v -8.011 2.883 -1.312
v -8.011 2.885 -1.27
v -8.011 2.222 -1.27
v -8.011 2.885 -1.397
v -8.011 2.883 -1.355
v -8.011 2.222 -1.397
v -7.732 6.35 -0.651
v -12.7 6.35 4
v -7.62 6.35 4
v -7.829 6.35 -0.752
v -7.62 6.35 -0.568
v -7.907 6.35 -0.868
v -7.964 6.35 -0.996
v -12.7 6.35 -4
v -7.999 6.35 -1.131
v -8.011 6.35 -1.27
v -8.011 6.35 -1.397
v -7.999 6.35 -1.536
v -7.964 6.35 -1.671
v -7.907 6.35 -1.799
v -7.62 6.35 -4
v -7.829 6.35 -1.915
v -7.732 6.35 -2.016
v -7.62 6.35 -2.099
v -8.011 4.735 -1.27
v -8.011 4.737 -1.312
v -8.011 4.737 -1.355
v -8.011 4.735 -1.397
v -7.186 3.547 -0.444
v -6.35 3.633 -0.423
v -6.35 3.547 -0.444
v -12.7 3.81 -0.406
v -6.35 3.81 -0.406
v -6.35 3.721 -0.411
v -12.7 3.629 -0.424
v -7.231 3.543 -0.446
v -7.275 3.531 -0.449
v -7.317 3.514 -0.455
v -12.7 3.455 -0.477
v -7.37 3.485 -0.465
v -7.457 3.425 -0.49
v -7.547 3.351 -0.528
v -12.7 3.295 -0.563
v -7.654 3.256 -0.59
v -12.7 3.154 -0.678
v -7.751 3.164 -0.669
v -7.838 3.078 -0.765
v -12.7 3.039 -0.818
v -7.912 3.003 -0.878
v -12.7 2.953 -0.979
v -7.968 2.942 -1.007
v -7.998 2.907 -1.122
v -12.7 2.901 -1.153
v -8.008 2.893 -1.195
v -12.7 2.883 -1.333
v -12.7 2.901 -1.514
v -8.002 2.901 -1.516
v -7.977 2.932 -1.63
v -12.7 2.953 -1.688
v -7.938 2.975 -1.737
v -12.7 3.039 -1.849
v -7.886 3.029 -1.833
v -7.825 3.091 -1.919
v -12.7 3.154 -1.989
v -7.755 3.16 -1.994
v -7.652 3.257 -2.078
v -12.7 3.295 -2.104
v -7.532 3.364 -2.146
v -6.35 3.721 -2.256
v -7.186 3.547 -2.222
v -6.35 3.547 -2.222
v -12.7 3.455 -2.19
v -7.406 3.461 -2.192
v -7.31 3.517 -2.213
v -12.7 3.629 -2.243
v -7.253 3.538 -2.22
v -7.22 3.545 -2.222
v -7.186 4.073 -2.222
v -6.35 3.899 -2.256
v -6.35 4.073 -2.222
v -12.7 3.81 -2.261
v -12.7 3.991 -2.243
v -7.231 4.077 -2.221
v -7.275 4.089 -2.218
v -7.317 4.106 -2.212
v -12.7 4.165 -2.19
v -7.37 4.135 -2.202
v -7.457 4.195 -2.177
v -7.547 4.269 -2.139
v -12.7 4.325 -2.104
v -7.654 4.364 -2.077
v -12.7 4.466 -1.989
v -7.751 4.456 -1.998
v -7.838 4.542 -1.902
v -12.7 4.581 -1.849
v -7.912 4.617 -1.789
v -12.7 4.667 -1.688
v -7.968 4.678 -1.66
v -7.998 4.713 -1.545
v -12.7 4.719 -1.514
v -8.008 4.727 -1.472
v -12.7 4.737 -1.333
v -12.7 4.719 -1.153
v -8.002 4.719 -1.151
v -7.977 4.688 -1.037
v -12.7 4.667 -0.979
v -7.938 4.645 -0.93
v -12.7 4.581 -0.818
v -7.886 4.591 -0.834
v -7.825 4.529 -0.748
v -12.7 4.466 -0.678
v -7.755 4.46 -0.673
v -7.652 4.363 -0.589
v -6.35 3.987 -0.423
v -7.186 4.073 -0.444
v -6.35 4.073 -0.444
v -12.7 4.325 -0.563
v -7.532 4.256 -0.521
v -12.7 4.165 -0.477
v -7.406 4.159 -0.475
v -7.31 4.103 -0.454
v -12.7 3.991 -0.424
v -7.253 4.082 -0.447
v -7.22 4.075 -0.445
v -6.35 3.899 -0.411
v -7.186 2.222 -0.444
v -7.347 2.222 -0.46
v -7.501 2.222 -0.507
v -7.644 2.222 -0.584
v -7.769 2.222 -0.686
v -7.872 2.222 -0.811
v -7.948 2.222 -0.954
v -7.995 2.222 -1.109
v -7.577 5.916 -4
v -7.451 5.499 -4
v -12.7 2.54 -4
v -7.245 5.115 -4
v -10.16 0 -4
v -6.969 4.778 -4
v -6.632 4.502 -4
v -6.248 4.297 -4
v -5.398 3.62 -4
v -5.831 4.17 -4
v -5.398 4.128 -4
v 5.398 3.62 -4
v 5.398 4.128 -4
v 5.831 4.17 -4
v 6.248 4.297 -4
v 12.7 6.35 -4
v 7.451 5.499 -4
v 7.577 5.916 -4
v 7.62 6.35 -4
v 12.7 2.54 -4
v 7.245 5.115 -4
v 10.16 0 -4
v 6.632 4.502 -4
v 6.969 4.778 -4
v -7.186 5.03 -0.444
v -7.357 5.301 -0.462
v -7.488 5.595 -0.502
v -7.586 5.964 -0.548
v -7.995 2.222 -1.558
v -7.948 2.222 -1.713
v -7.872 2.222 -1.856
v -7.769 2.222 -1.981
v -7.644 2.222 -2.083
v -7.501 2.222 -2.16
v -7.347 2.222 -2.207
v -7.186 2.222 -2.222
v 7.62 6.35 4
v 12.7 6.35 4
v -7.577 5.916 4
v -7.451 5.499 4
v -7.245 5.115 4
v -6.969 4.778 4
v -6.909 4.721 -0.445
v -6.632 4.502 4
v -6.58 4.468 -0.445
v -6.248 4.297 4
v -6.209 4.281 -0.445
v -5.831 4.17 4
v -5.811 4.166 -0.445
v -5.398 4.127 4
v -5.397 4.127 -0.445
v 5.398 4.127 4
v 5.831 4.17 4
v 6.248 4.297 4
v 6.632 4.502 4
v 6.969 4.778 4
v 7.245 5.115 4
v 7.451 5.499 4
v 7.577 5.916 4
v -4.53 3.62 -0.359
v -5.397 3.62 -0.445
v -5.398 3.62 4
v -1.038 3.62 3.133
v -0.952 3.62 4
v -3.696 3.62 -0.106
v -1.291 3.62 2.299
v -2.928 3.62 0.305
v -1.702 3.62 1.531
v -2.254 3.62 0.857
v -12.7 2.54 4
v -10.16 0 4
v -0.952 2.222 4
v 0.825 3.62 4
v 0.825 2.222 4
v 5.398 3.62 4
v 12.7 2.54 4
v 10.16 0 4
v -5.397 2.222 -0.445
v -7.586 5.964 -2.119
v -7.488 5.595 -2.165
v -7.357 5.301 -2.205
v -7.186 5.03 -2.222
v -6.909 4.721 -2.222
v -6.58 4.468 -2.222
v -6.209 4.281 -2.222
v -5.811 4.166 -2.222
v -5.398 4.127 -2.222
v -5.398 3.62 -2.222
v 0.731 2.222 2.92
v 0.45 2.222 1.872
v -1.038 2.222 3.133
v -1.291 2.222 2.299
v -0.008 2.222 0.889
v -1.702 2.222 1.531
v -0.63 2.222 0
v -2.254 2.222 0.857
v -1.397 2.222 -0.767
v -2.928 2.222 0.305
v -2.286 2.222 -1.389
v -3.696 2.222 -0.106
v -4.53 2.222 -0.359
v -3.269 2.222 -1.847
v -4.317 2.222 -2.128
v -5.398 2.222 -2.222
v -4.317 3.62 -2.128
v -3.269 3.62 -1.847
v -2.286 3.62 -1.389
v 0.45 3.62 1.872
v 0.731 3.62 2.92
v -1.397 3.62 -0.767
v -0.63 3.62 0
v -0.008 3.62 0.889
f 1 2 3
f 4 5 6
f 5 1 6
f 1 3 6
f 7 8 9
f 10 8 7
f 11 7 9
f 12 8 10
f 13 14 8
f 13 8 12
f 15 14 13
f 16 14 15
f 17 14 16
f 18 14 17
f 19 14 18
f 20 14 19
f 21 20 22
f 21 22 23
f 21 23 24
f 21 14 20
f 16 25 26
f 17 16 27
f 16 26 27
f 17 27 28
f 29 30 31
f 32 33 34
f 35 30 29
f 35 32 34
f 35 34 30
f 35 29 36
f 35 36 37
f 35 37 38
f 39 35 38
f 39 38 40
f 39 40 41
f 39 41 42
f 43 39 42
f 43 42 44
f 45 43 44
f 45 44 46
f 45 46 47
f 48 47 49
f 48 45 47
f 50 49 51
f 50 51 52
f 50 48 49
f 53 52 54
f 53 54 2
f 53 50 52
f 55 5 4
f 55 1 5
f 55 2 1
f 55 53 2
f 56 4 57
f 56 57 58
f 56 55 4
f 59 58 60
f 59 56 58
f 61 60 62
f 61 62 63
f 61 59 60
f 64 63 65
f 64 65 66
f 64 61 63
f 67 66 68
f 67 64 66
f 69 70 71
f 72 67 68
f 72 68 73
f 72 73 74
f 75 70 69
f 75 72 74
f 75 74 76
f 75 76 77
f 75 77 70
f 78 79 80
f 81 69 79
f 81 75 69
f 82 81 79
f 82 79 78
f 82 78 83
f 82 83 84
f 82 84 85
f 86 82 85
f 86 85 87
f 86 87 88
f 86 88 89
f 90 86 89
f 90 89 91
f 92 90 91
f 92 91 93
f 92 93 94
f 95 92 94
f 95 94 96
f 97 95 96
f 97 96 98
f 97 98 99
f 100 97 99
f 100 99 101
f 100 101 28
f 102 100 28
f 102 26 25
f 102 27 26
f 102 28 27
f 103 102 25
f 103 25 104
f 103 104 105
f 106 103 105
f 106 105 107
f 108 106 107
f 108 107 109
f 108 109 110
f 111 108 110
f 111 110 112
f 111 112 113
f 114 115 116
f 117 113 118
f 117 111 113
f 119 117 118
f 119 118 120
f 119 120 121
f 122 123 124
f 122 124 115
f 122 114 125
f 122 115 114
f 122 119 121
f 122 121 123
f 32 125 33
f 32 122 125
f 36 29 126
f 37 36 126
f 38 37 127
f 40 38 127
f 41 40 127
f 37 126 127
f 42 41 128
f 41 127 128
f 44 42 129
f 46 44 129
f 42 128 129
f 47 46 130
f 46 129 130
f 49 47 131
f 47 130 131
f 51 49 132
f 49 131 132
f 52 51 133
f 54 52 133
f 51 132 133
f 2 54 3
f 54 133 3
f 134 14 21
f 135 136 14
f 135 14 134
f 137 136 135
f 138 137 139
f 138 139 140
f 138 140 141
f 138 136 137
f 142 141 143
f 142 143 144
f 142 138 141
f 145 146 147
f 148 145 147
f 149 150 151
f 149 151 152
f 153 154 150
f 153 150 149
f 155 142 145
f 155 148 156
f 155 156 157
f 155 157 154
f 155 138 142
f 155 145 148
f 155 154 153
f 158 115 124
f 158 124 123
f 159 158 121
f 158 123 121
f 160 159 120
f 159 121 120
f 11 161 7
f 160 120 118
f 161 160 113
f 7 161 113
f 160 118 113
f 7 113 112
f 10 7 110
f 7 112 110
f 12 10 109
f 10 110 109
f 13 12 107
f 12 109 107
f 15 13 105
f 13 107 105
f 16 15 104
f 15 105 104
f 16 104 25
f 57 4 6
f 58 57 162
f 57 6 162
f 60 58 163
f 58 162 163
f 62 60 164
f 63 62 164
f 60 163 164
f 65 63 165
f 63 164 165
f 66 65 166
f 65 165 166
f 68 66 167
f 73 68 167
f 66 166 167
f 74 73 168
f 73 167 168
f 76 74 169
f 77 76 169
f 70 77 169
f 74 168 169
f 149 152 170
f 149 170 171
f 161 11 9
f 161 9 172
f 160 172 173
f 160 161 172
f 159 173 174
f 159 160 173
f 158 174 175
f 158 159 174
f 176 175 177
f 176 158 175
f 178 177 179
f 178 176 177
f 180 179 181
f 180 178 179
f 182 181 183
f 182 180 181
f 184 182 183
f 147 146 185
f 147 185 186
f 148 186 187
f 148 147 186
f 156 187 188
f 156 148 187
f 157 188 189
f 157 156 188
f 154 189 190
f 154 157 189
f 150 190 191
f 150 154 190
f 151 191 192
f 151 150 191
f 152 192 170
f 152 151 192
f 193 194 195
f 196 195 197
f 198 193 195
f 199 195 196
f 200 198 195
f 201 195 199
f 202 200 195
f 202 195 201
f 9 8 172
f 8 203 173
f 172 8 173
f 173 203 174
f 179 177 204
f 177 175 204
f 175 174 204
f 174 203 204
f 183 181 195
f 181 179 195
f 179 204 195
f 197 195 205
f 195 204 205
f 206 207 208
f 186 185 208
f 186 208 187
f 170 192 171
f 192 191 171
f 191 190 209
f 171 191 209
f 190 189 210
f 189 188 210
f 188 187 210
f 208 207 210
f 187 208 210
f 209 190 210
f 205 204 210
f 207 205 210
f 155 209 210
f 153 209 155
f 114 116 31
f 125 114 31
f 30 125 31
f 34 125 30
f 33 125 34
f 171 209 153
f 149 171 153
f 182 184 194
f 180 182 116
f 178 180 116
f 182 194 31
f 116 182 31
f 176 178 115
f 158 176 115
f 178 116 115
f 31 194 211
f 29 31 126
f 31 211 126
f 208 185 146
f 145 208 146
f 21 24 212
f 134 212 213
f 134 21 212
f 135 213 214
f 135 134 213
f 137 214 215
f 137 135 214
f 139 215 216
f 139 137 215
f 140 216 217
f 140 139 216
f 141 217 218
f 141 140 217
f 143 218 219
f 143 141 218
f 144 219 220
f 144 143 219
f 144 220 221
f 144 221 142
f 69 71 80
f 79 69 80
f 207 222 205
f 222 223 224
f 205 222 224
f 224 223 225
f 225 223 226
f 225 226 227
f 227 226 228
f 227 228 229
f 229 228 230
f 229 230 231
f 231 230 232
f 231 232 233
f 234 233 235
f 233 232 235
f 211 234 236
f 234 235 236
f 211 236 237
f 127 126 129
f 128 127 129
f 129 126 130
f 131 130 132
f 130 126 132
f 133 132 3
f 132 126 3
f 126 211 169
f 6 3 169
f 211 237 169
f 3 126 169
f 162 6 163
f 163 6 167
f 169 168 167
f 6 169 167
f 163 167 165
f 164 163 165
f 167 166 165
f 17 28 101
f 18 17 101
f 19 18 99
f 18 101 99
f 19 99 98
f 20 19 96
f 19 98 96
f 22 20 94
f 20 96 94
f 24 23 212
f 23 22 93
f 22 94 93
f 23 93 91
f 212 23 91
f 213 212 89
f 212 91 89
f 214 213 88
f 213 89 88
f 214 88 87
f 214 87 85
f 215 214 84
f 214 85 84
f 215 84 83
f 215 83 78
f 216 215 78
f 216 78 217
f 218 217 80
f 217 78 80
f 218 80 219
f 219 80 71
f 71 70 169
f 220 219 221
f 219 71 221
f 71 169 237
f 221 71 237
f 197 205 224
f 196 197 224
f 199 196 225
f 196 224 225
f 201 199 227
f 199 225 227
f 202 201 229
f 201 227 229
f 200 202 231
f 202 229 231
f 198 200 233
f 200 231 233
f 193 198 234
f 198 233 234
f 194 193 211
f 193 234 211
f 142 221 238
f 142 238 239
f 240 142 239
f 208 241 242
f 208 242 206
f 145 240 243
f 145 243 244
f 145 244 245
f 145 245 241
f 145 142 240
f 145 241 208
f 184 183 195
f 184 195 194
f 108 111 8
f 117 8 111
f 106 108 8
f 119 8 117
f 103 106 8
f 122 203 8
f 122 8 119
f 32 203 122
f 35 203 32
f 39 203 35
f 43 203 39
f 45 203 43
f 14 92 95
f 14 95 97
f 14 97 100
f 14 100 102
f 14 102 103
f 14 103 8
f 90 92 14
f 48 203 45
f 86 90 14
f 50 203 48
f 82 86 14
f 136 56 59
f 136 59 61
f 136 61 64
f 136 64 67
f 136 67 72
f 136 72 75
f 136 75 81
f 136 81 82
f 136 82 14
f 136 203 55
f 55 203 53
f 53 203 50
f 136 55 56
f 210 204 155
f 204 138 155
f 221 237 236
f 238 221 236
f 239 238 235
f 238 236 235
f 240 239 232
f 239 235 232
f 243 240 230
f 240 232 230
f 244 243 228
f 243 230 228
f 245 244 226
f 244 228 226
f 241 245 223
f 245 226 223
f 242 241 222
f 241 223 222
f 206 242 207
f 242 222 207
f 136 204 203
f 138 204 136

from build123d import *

# Parameters (mm, degrees)
SKETCH1_W               = 25.4
SKETCH1_H               = 8.001
BOSS_EXTRUDE1_DEPTH     = 6.35
CUT_EXTRUDE1_DEPTH      = 25.4
CUT_EXTRUDE2_DEPTH      = 14.940238753
CUT_EXTRUDE2_DEPTH_BACK = 1.905
CUT_EXTRUDE3_START      = -25.4
SKETCH5_R               = 0.9271
CUT_EXTRUDE3_DEPTH      = 6.35
SKETCH6_W               = 10.795
SKETCH6_H               = 8.001
CUT_EXTRUDE4_DEPTH      = 0.508
CHAMFER1_SIZE           = 2.54


with BuildPart() as part:
    # Sketch1 → Boss-Extrude1 (new body)
    with BuildSketch(Plane(origin=(0, 0, 0), x_dir=(1, 0, 0), z_dir=(0, 1, 0))):
        Rectangle(SKETCH1_W, SKETCH1_H)
    extrude(amount=BOSS_EXTRUDE1_DEPTH)

    # Sketch2 → Cut-Extrude1 (cut)
    with BuildSketch(Plane(origin=(0, 0, -4.0005), x_dir=(-1, 0, 0), z_dir=(0, 0, -1))):
        with BuildLine():
            Line((5.3975, 4.1275), (-5.3975, 4.1275))
            ThreePointArc((-5.3975, 4.1275), (-7.62, 6.35), (-5.3975, 8.5725))
            Line((-5.3975, 8.5725), (5.3975, 8.5725))
            ThreePointArc((5.3975, 8.5725), (7.62, 6.35), (5.3975, 4.1275))
        make_face()
    extrude(amount=-CUT_EXTRUDE1_DEPTH, mode=Mode.SUBTRACT)

    # Sketch4 → Cut-Extrude2 (cut, two sides: drawn at the far end of the back side and taken through both)
    with BuildSketch(Plane(origin=(0, 4.1275, 0), x_dir=(1, 0, 0), z_dir=(0, 1, 0)).offset(-CUT_EXTRUDE2_DEPTH_BACK)):
        with BuildLine():
            Line((0.8255, -4.0005), (-0.9525, -4.0005))
            ThreePointArc((-0.9525, -4.0005), (-2.254410358, -0.857410358), (-5.3975, 0.4445))
            Line((-5.3975, 0.4445), (-7.185501788, 0.4445))
            ThreePointArc((-7.185501788, 0.4445), (-7.769218436, 0.686283352), (-8.011001788, 1.27))
            Line((-8.011001788, 1.27), (-8.011001788, 1.397))
            ThreePointArc((-8.011001788, 1.397), (-7.769218436, 1.980716648), (-7.185501788, 2.2225))
            Line((-7.185501788, 2.2225), (-5.3975, 2.2225))
            ThreePointArc((-5.3975, 2.2225), (-0.997174501, 0.399825499), (0.8255, -4.0005))
        make_face()
    extrude(amount=CUT_EXTRUDE2_DEPTH + CUT_EXTRUDE2_DEPTH_BACK, mode=Mode.SUBTRACT)

    # Sketch5 → Cut-Extrude3 (cut)
    with BuildSketch(Plane(origin=(12.7, 0, 0), x_dir=(0, 0, -1), z_dir=(1, 0, 0)).offset(CUT_EXTRUDE3_START)):
        with Locations(Location((1.3335, 3.81, 0), (0, 0, 180))):
            Circle(SKETCH5_R)
    extrude(amount=CUT_EXTRUDE3_DEPTH, mode=Mode.SUBTRACT)

    # Sketch6 → Cut-Extrude4 (cut)
    with BuildSketch(Plane(origin=(0, 4.1275, 0), x_dir=(1, 0, 0), z_dir=(0, 1, 0))):
        Rectangle(SKETCH6_W, SKETCH6_H)
    extrude(amount=-CUT_EXTRUDE4_DEPTH, mode=Mode.SUBTRACT)

    # Chamfer1
    chamfer1_edges = [part.edges().sort_by_distance(p)[0] for p in [
        (-12.7, 0, 0),
        (12.7, 0, 0),
    ]]
    chamfer(chamfer1_edges, length=CHAMFER1_SIZE)


solid = part.part
